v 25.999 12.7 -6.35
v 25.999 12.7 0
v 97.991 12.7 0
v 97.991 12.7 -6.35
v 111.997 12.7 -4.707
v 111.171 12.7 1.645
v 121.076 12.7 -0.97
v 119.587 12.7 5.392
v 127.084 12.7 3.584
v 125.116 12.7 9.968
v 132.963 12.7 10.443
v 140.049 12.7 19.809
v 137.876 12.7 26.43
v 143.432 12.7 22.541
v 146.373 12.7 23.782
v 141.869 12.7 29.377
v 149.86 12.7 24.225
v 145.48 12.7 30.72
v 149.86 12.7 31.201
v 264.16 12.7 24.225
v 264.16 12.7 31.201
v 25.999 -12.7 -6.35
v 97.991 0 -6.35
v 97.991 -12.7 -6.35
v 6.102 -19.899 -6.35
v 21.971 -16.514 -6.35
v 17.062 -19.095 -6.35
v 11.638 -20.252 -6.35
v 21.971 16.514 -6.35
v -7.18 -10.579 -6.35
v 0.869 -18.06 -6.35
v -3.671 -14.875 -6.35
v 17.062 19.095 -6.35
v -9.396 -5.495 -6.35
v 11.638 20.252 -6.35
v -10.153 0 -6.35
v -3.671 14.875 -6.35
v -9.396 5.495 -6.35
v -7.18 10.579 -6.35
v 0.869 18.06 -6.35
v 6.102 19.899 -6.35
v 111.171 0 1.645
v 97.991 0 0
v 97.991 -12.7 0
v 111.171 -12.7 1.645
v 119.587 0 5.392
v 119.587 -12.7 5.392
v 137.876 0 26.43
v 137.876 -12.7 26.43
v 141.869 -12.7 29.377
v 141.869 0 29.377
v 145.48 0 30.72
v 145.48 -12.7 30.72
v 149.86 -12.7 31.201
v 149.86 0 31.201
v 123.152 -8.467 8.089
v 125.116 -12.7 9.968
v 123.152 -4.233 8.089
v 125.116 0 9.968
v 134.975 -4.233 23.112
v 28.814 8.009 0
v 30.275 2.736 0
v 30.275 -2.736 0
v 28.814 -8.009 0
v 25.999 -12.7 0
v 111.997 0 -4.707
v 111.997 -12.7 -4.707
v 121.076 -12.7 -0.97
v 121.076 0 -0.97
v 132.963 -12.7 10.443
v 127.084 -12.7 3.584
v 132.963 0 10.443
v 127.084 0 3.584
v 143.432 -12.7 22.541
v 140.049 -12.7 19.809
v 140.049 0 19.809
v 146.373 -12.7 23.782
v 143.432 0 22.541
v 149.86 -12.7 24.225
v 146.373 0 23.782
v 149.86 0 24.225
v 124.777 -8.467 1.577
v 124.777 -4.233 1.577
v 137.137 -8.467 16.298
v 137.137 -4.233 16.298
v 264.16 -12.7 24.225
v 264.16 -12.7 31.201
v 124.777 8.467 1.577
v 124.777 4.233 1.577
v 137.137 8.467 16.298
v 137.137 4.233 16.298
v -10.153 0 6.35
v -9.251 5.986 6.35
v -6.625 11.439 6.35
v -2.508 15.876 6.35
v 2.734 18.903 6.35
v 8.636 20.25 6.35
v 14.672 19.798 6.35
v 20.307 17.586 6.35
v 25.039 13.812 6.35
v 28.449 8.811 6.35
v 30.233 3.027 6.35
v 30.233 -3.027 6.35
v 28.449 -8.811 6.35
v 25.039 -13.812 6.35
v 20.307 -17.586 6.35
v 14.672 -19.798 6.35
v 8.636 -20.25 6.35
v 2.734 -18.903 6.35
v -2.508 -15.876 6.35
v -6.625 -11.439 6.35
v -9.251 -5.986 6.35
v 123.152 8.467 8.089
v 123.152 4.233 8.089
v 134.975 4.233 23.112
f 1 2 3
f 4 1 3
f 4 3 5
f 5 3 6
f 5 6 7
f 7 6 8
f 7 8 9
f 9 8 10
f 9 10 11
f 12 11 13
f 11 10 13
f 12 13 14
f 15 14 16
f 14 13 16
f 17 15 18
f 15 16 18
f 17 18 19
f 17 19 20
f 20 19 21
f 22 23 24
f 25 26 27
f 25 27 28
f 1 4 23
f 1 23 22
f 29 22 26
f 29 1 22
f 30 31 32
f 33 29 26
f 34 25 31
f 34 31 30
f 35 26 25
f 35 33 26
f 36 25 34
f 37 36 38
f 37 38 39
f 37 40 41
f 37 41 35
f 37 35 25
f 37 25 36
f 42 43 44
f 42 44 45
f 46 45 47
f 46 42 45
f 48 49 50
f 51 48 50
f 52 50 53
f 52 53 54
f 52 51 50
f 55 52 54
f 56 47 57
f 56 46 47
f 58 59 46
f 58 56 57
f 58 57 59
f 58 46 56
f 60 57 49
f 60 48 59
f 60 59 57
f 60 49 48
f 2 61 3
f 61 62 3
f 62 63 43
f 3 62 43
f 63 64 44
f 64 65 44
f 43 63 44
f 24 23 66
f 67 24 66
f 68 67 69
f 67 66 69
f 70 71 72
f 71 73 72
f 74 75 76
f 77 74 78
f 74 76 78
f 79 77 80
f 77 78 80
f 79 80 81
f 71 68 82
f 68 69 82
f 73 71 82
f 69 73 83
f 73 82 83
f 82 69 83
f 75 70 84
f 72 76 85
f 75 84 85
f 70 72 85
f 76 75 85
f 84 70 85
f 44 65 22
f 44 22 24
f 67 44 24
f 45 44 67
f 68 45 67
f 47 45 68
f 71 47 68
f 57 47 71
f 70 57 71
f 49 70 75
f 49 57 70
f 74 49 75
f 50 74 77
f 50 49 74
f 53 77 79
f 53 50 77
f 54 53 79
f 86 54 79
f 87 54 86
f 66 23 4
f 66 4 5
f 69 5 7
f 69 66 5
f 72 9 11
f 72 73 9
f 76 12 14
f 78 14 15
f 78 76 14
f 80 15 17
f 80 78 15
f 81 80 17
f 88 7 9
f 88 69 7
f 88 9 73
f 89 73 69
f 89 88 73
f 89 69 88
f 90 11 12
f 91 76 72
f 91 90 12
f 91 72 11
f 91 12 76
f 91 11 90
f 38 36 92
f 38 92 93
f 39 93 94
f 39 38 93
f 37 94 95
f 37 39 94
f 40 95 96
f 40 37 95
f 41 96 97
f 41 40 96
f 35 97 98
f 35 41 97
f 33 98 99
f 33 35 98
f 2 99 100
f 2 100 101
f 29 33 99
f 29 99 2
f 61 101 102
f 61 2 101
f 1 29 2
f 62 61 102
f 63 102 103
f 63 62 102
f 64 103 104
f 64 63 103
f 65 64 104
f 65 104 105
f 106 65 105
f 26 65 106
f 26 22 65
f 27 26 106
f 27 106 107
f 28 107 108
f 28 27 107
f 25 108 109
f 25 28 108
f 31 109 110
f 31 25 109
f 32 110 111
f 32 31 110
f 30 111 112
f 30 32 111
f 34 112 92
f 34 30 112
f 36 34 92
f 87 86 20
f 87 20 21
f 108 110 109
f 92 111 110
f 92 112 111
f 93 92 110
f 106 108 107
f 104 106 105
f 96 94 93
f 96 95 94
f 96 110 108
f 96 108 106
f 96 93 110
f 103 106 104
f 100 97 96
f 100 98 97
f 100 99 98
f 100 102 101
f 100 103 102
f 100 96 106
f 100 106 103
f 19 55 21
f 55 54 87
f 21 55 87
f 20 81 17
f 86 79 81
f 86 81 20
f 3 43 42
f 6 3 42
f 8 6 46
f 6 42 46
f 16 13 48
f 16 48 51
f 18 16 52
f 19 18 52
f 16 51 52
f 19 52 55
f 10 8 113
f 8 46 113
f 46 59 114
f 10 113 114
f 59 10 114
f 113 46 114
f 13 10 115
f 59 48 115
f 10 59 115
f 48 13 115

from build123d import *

# Parameters (mm, degrees)
F0_W     = 87.8377447401
F0_H     = 6.35
F0_W_2   = 114.3
F0_H_2   = 6.9760140031
F1_DEPTH = 12.7


with BuildPart() as f1:
    # F0 (on Front) → F1 (new body, symmetric)
    with BuildSketch(Plane.XZ):
        with Locations((54.0722241176, -3.175)):
            Rectangle(F0_W, F0_H)
        with BuildLine():
            add(Edge.make_bspline(
                [(97.9910964877, 0), (135.2877169847, 0), (127.9766007824, 31.2006380408), (149.8604118824, 31.2006380408)],
                knots=[0, 0, 0, 0, 60.5302048045, 60.5302048045, 60.5302048045, 60.5302048045], degree=3))
            Line((97.9910964877, 0), (97.9910964877, -6.35))
            add(Edge.make_bspline(
                [(97.9910964877, -6.35), (136.9185000658, -6.35), (132.026180625, 24.2246240377), (149.8604118824, 24.2246240377)],
                knots=[0, 0, 0, 0, 60.2099120957, 60.2099120957, 60.2099120957, 60.2099120957], degree=3))
            Line((149.8604118824, 24.2246240377), (149.8604118824, 31.2006380408))
        make_face()
        with Locations((207.0104118824, 27.7126310393)):
            Rectangle(F0_W_2, F0_H_2)
    extrude(amount=F1_DEPTH, both=True)

    # F0 (on Front) → F2 (revolve)
    with BuildSketch(Plane.XZ):
        Polygon((10.1533517476, 6.35), (-10.1533517476, 6.35), (-10.1533517476, -6.35), (10.1533517476, -6.35), (10.1533517476, 0), align=None)
    revolve(axis=Axis((10.1533517476, 0, 0), (0, 0, -1)))


solid = f1.part
